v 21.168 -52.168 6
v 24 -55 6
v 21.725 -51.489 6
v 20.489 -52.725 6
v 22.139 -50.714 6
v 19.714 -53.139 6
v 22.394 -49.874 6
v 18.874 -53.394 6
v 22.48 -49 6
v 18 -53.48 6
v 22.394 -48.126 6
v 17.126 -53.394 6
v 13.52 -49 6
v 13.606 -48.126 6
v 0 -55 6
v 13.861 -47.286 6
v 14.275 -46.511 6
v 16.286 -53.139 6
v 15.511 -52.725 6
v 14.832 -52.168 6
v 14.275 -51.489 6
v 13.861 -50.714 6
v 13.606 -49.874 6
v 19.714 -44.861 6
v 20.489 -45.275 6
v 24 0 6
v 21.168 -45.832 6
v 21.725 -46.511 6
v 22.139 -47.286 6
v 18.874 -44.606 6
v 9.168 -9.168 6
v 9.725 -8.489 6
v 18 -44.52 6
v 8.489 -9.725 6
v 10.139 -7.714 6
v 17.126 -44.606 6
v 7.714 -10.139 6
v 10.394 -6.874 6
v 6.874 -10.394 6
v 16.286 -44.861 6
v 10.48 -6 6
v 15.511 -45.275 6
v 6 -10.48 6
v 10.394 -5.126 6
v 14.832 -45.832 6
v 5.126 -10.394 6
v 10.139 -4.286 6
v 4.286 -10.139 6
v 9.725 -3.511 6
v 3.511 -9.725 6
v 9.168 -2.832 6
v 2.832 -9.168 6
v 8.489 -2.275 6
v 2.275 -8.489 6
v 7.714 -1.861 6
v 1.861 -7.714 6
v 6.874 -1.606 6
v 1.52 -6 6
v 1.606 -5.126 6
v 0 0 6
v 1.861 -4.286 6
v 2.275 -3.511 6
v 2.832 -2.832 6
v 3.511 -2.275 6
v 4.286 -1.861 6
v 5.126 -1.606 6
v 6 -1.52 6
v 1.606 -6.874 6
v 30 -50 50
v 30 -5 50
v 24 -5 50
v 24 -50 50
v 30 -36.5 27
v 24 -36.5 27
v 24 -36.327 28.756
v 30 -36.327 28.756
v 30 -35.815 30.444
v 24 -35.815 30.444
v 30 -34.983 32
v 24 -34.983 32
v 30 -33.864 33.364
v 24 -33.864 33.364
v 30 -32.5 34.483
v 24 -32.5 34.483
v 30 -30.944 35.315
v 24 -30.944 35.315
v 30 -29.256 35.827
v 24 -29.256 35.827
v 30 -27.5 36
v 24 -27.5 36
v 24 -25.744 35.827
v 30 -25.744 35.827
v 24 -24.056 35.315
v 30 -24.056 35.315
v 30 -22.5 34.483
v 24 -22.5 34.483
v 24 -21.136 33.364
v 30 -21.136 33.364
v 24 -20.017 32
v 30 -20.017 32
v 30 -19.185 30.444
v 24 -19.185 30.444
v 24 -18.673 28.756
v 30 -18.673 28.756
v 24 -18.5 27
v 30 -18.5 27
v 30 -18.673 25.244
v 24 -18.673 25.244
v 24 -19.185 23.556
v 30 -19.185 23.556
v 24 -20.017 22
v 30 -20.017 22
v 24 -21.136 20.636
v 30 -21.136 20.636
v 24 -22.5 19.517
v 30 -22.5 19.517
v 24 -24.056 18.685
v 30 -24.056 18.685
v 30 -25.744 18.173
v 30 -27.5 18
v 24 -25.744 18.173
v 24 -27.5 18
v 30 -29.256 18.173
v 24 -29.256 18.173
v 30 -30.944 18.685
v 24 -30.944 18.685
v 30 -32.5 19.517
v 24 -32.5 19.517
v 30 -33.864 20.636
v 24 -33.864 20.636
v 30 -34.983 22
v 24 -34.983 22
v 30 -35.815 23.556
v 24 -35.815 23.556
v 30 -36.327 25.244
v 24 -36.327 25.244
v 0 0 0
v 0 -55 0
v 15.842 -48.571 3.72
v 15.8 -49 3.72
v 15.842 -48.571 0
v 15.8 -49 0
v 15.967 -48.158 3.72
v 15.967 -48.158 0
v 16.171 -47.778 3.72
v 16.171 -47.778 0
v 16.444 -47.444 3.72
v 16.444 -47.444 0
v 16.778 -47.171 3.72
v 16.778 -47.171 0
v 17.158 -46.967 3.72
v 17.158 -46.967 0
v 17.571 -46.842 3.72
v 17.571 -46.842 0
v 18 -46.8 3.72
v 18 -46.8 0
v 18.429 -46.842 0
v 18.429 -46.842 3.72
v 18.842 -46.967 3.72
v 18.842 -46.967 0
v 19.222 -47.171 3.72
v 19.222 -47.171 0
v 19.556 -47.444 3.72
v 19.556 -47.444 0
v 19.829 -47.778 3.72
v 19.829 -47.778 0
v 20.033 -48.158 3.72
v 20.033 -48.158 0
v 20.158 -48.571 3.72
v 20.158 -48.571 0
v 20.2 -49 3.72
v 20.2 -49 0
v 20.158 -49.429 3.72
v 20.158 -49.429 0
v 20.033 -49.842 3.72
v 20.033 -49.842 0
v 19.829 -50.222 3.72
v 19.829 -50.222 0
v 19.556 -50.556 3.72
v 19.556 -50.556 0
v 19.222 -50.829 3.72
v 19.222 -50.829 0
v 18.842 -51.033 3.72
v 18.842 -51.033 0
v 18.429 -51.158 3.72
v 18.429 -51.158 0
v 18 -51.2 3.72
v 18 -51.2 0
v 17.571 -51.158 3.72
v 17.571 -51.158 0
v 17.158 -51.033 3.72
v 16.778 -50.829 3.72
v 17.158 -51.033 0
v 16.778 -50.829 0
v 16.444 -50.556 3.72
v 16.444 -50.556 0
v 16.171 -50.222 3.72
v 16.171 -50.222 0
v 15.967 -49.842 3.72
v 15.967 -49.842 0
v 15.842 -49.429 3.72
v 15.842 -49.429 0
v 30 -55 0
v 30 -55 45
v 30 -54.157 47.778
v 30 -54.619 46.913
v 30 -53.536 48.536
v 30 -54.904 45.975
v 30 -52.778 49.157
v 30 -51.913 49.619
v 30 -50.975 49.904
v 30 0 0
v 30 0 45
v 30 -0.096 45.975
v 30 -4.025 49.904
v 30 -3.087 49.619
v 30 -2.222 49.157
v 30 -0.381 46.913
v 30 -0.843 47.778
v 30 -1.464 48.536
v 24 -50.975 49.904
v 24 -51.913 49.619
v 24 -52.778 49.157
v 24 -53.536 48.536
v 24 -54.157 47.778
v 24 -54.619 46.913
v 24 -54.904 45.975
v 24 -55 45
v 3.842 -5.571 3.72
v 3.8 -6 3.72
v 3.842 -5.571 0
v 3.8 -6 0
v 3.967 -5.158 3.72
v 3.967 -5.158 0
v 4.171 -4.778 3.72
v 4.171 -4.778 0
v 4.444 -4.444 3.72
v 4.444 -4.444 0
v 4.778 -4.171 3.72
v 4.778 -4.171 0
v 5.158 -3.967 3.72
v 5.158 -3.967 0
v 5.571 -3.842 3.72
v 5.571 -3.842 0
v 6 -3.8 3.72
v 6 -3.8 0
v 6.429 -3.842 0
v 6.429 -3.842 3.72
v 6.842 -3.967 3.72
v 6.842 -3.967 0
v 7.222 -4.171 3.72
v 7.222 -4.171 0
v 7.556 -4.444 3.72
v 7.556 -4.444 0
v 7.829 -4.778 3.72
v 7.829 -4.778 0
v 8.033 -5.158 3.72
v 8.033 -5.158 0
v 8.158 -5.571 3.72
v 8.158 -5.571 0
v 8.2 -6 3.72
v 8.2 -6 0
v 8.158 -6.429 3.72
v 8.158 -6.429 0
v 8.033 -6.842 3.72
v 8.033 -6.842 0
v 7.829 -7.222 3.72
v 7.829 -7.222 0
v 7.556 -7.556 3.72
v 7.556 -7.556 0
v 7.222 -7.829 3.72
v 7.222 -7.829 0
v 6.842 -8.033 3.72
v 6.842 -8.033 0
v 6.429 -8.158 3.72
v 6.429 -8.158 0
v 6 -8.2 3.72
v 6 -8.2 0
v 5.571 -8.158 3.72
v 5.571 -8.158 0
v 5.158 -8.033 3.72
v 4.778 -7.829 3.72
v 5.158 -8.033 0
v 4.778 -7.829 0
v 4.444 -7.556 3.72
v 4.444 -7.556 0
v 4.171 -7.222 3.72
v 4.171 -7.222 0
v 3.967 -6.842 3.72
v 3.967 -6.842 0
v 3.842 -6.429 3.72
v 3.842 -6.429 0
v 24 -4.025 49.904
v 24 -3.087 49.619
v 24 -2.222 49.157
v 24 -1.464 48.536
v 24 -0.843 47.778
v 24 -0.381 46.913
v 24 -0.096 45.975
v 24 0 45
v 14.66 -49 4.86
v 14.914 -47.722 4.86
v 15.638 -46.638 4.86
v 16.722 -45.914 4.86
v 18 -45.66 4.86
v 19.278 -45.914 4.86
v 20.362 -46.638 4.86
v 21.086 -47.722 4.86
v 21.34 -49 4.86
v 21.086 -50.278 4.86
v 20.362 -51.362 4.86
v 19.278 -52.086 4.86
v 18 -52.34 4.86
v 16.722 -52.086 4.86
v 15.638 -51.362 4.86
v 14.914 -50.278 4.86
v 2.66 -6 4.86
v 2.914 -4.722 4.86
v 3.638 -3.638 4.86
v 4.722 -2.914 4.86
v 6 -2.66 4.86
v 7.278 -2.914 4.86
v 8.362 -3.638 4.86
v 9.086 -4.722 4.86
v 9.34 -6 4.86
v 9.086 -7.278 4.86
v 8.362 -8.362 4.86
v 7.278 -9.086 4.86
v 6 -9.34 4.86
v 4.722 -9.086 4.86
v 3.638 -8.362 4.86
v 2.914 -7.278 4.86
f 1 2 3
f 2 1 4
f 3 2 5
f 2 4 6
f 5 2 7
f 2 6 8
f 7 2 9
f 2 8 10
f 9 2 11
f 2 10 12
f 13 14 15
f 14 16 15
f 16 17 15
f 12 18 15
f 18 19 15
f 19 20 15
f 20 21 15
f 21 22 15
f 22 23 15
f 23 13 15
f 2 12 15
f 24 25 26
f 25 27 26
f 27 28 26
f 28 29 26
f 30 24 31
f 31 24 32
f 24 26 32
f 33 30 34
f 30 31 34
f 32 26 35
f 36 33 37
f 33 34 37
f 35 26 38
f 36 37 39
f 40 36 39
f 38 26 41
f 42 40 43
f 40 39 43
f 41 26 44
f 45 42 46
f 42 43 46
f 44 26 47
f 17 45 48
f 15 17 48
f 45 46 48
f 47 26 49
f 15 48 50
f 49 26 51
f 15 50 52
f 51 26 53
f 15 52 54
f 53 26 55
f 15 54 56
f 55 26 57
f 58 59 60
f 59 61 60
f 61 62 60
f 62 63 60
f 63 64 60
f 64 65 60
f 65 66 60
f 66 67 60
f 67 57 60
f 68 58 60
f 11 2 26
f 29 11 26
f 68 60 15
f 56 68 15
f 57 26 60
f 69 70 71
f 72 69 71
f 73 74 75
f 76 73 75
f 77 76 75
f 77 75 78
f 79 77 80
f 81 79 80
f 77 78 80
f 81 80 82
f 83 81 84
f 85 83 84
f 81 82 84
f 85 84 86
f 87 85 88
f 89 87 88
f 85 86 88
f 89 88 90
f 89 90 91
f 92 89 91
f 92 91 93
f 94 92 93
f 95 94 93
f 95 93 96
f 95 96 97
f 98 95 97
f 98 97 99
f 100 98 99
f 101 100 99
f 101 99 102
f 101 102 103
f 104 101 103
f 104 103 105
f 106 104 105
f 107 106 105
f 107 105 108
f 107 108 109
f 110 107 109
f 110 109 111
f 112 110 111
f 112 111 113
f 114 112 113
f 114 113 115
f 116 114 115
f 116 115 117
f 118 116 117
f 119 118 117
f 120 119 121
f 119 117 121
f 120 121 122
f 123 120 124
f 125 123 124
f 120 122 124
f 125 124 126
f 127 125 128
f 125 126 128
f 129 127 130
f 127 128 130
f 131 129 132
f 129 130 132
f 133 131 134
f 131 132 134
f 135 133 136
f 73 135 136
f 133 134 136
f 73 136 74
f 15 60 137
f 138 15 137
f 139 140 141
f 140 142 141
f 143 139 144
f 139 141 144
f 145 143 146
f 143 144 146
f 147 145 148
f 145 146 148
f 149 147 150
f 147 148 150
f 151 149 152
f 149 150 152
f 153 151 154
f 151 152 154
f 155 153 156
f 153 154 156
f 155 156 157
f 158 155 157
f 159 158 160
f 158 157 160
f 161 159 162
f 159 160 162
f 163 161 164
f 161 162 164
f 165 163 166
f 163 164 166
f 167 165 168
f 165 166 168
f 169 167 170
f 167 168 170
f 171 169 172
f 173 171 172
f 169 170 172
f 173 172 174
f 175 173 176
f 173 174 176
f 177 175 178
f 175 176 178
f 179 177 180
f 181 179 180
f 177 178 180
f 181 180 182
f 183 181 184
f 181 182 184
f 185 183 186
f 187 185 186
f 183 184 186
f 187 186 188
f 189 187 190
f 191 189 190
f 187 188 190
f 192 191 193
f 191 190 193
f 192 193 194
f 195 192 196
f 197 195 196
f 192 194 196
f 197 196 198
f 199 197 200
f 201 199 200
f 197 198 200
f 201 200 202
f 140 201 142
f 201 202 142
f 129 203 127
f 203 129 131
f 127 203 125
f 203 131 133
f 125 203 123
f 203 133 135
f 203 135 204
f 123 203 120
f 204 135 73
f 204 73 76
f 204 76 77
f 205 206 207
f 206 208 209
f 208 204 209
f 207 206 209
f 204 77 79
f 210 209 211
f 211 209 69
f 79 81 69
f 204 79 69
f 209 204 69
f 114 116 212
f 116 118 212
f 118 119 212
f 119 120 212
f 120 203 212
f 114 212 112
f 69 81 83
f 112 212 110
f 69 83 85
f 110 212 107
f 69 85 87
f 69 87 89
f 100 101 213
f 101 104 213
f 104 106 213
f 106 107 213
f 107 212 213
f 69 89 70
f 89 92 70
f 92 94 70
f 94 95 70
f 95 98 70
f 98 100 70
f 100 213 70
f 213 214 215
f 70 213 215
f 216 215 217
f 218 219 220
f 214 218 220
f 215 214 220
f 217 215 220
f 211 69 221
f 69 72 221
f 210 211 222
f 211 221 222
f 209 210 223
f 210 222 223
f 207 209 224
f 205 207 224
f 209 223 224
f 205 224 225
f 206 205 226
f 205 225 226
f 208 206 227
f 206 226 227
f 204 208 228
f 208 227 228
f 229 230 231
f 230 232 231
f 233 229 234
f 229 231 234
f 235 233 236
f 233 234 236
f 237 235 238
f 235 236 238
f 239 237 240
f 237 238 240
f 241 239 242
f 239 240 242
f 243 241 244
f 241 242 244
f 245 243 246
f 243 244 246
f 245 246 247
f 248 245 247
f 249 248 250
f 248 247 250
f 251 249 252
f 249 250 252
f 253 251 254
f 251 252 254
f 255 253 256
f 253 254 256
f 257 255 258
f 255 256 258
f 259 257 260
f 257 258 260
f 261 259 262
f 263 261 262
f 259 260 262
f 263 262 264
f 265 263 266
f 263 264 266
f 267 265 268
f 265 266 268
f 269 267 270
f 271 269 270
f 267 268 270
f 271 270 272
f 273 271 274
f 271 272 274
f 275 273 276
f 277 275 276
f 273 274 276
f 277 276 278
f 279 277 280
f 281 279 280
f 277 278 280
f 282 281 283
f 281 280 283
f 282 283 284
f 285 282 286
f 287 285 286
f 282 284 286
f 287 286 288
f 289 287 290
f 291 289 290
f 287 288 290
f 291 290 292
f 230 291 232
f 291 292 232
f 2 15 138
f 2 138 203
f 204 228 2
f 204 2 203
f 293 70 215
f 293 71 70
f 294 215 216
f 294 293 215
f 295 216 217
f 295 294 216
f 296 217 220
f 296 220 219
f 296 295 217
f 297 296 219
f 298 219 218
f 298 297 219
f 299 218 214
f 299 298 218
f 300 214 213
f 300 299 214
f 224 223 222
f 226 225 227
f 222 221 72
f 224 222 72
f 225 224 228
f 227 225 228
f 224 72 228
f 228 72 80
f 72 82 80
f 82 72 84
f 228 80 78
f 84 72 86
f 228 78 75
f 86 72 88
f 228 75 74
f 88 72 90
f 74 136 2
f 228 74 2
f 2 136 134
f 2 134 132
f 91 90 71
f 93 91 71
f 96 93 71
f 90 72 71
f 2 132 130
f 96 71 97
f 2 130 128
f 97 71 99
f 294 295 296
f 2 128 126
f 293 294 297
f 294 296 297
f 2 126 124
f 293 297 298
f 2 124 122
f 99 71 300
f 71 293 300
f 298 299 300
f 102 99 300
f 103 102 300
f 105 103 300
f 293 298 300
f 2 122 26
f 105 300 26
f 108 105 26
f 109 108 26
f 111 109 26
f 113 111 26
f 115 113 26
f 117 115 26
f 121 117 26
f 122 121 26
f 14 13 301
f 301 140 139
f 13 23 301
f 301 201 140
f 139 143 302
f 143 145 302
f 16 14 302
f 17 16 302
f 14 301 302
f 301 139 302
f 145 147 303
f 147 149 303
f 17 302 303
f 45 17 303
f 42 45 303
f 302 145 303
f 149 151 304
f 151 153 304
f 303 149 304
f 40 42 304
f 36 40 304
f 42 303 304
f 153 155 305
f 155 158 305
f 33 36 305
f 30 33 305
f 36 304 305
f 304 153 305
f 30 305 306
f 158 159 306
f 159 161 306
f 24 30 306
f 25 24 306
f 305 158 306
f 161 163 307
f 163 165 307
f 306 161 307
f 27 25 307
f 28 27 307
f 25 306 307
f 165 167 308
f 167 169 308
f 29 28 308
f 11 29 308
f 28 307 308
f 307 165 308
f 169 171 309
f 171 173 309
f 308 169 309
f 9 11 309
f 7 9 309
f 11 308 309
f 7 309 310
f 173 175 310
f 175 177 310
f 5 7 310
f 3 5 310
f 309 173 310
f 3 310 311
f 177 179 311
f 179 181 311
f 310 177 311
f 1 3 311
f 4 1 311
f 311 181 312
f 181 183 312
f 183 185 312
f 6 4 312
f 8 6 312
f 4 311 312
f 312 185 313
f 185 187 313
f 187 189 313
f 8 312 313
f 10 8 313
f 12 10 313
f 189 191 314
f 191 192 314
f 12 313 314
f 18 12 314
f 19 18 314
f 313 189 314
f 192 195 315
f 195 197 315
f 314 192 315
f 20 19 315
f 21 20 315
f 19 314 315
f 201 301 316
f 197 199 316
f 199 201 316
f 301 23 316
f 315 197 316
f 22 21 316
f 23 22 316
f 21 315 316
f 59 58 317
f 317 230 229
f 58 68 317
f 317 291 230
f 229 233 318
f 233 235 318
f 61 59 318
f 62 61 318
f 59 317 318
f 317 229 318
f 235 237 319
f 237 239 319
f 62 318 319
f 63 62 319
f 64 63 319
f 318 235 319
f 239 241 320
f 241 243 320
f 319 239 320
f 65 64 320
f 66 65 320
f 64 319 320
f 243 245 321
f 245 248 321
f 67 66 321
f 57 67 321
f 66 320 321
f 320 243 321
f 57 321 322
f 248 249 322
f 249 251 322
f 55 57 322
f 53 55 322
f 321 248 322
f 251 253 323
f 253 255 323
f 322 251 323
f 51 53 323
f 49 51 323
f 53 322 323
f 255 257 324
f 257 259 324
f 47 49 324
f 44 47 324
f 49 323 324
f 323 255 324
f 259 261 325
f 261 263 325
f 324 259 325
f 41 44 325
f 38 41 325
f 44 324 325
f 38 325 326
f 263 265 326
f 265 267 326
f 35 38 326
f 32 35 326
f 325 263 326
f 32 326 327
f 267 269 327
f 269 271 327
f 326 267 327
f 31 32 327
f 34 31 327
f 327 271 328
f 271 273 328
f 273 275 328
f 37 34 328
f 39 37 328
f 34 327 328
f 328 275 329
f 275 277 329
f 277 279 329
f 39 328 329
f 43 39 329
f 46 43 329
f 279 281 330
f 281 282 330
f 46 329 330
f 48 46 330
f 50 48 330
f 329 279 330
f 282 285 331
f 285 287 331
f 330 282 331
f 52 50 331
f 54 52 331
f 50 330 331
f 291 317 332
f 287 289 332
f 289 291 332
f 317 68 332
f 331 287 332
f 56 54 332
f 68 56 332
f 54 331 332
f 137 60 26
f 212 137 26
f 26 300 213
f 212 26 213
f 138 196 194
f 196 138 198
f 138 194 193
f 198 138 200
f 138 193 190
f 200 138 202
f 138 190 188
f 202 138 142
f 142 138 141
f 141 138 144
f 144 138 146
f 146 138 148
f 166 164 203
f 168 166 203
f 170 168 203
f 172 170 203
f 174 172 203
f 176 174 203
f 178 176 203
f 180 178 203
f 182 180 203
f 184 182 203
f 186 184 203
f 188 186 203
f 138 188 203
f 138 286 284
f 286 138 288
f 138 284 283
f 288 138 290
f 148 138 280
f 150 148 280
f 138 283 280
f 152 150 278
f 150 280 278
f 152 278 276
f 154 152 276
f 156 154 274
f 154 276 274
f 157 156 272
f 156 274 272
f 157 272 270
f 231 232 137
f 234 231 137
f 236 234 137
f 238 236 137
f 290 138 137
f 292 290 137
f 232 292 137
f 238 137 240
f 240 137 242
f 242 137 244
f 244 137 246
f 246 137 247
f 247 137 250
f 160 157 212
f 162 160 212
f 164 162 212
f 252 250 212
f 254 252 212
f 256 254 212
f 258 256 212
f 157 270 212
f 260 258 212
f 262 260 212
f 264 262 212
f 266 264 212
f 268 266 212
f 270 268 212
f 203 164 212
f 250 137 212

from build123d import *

# Parameters (mm, degrees)
F1_DEPTH       = 55
F2_R           = 5
F3_R           = 9
F4_DEPTH       = 6.001
F6_D           = 4.4
F6_DEPTH       = 18
F6_CSINK_D     = 8.96
F6_CSINK_ANGLE = 90
F6_TIP         = 1.3218933619


with BuildPart() as f1:
    # F0 (on Front) → F1 (new body)
    with BuildSketch(Plane.XZ):
        Polygon((0, 6), (0, 0), (30, 0), (30, 50), (24, 50), (24, 6), align=None)
    extrude(amount=F1_DEPTH)

    # F2
    f2_edges = [f1.edges().sort_by_distance(p)[0] for p in [
        (27, -55, 50),
        (27, 0, 50),
    ]]
    fillet(f2_edges, radius=F2_R)

    # F3 (on face) → F4 (cut, through all)
    with BuildSketch(Plane(origin=(24, 0, 0), x_dir=(0, -1, 0), z_dir=(-1, 0, 0))):
        with Locations((27.5, 27)):
            Circle(F3_R)
    extrude(amount=-F4_DEPTH, mode=Mode.SUBTRACT)

    # F6
    with Locations(Plane.XY.offset(6)):
        with Locations((6, -6), (18, -49)):
            CounterSinkHole(F6_D / 2, F6_CSINK_D / 2, depth=F6_DEPTH, counter_sink_angle=F6_CSINK_ANGLE)
            with Locations((0, 0, -(F6_DEPTH + F6_TIP / 2))):  # 118° drill point
                Cone(0, F6_D / 2, F6_TIP, mode=Mode.SUBTRACT)


solid = f1.part
